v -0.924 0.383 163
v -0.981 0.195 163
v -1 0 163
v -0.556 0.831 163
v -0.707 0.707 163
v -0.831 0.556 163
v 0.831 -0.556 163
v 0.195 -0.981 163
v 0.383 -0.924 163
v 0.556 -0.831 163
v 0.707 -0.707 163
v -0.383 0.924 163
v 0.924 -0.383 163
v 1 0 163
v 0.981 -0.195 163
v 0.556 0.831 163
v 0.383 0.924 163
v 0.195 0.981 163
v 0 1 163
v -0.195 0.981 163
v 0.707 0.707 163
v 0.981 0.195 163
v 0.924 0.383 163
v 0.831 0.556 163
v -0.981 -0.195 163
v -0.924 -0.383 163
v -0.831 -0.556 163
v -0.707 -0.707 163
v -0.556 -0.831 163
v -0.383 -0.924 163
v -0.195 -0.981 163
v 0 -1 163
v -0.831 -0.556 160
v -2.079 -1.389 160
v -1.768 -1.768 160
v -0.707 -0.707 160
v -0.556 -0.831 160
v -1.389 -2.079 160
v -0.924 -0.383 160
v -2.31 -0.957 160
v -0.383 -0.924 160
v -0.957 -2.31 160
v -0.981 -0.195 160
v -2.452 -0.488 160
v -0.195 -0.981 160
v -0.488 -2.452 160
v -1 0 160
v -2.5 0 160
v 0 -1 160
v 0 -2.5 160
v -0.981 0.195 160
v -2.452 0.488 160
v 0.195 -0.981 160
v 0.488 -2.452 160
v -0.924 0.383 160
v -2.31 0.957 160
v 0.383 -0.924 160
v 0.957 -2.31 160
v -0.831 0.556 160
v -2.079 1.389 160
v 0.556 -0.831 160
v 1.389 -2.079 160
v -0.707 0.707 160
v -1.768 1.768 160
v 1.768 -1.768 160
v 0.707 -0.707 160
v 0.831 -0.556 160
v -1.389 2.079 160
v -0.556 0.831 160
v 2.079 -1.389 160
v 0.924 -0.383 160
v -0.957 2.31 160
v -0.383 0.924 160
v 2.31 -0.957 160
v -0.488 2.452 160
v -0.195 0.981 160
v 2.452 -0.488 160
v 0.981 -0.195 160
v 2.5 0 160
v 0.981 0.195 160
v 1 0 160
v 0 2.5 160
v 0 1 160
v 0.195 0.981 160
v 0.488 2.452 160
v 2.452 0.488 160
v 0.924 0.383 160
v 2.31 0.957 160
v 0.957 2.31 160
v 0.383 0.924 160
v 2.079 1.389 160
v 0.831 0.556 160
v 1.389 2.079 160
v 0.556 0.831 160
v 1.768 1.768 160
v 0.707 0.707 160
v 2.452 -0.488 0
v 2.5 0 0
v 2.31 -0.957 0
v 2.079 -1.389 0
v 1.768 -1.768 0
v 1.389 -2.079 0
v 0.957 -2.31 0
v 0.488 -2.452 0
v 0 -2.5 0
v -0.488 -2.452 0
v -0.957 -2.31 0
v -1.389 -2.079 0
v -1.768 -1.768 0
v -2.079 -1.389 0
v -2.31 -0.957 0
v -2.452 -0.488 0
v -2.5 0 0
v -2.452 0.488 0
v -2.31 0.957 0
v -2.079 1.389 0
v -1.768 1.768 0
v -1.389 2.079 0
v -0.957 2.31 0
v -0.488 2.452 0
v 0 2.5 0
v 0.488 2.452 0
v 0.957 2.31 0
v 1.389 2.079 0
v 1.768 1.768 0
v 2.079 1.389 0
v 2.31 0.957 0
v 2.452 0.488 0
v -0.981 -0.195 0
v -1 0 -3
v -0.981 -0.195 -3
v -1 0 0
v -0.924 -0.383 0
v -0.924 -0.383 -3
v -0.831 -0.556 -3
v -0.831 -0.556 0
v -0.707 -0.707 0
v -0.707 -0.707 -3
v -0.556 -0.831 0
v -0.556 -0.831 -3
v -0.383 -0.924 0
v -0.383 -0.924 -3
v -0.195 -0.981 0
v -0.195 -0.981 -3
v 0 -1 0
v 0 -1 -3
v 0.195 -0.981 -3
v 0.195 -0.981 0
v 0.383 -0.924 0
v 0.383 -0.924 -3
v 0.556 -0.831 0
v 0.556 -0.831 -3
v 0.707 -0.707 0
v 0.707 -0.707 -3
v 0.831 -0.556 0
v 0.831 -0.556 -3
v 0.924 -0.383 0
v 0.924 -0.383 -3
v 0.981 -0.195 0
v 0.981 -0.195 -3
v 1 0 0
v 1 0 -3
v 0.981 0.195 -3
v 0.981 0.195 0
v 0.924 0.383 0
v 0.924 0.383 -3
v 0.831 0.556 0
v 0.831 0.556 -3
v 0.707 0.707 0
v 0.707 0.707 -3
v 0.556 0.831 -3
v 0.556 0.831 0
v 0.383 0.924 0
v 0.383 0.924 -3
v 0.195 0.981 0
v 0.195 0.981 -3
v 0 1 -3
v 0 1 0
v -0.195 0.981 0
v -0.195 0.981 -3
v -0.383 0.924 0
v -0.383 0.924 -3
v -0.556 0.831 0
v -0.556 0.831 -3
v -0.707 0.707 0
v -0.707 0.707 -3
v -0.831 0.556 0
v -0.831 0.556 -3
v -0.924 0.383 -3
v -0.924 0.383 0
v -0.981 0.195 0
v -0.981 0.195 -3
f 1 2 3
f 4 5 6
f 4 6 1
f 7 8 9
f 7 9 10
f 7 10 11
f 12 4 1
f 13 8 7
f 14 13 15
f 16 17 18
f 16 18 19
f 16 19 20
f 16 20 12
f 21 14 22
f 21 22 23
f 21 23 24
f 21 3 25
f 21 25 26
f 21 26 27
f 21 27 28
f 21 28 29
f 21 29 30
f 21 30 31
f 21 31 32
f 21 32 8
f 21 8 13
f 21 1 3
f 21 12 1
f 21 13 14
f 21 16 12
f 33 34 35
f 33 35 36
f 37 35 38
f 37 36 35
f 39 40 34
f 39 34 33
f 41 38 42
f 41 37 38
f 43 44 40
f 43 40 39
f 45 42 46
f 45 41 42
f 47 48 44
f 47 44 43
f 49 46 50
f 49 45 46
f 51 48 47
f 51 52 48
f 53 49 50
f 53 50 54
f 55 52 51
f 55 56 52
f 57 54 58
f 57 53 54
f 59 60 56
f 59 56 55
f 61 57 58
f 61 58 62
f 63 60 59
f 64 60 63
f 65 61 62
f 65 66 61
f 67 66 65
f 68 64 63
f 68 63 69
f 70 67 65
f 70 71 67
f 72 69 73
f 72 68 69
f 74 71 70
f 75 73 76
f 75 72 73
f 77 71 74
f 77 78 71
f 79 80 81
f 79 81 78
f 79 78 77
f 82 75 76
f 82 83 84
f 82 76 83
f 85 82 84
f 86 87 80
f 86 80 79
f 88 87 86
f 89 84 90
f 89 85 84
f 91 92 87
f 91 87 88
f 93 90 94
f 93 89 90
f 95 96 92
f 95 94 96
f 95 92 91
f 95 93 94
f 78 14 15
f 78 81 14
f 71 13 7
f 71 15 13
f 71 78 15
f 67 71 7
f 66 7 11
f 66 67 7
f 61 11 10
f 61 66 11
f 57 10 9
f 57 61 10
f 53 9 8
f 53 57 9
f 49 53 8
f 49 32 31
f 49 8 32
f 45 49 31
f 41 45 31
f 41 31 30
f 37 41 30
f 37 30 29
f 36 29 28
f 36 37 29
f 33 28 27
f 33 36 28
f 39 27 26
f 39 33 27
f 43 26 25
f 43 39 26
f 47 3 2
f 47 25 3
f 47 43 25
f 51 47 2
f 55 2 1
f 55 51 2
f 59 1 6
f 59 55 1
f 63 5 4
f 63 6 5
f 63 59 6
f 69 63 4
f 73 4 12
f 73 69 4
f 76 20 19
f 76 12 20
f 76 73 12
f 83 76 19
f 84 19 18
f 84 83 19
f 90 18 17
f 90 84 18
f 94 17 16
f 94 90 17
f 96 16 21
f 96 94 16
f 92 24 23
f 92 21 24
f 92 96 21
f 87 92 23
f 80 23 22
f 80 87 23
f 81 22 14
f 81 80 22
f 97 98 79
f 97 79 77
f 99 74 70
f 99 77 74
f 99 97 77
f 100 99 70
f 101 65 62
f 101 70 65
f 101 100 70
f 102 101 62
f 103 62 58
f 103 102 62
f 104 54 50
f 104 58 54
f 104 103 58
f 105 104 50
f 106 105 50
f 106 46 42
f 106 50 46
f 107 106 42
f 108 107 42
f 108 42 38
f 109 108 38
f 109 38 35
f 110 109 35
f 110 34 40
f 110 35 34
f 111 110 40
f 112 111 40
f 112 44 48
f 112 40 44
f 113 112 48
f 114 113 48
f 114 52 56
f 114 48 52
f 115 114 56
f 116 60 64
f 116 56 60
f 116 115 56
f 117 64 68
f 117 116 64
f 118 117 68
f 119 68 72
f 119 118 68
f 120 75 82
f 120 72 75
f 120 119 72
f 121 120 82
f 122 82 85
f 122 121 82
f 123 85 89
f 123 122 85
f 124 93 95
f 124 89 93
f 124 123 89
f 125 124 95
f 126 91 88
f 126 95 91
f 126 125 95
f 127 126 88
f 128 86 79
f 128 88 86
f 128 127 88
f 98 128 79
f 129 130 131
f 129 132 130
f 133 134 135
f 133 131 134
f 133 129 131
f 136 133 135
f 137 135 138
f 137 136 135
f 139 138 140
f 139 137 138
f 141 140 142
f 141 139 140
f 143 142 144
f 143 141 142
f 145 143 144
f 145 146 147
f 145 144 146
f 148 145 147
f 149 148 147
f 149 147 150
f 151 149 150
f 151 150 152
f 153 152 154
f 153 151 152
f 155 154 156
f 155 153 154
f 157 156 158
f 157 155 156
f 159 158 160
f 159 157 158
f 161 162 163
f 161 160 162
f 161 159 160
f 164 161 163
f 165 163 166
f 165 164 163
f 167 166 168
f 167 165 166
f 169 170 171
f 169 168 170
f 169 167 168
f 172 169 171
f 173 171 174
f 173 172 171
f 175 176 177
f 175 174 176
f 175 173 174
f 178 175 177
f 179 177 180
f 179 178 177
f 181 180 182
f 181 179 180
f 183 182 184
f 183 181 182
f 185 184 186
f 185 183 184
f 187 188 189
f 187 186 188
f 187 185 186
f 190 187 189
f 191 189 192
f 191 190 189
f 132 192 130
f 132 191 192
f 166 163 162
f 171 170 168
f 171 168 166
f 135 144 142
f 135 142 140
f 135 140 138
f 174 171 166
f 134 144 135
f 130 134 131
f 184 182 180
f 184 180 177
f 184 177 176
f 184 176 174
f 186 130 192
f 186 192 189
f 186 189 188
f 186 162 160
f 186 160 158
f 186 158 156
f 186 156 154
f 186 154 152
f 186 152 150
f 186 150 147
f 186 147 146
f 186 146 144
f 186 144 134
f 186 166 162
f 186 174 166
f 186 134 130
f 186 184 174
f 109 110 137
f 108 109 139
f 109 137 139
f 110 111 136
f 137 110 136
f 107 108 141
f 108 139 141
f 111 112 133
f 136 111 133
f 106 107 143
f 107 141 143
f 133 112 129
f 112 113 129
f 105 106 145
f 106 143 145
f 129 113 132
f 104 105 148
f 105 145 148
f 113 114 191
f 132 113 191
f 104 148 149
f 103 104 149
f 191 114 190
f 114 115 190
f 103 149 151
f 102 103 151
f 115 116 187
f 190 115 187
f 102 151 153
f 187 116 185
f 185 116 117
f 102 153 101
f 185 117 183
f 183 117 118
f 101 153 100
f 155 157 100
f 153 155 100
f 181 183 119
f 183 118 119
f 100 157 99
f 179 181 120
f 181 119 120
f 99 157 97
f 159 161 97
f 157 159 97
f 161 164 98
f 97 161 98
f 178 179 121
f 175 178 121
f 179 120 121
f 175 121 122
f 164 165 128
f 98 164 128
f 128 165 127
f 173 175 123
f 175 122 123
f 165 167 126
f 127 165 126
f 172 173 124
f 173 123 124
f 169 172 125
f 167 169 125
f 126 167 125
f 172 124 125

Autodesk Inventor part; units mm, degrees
ref_plane "YZ Plane" through (0, 0, 0) normal (1, 0, 0) x (0, 1, 0)
ref_plane "XZ Plane" through (0, 0, 0) normal (0, 1, 0) x (-1, 0, 0)
ref_plane "XY Plane" through (0, 0, 0) normal (0, 0, 1) x (1, 0, 0)
sketch "Sketch1" plane through (0, 0, 0) normal (0, 0, 1) x (1, 0, 0)
  circle A0 centre (0, 0) radius 2.5
  dimension "d0" = 5
extrude "Extrusion1" add sketch "Sketch1" along normal blind 160
sketch "Sketch2" plane through (0, 0, 160) normal (0, 0, 1) x (1, 0, 0)
  circle A0 centre (0, 0) radius 2.5 projected
  circle A1 centre (0, 0) radius 1
  dimension "d3" = 2
extrude "Extrusion2" add sketch "Sketch2" along normal blind 3 contours A1
sketch "Sketch3" plane through (0, 0, 0) normal (0, 0, -1) x (-1, 0, 0)
  circle A0 centre (0, 0) radius 1
  dimension "d6" = 2
extrude "Extrusion3" add sketch "Sketch3" along normal blind 3
properties part number "Bone-16cm"
